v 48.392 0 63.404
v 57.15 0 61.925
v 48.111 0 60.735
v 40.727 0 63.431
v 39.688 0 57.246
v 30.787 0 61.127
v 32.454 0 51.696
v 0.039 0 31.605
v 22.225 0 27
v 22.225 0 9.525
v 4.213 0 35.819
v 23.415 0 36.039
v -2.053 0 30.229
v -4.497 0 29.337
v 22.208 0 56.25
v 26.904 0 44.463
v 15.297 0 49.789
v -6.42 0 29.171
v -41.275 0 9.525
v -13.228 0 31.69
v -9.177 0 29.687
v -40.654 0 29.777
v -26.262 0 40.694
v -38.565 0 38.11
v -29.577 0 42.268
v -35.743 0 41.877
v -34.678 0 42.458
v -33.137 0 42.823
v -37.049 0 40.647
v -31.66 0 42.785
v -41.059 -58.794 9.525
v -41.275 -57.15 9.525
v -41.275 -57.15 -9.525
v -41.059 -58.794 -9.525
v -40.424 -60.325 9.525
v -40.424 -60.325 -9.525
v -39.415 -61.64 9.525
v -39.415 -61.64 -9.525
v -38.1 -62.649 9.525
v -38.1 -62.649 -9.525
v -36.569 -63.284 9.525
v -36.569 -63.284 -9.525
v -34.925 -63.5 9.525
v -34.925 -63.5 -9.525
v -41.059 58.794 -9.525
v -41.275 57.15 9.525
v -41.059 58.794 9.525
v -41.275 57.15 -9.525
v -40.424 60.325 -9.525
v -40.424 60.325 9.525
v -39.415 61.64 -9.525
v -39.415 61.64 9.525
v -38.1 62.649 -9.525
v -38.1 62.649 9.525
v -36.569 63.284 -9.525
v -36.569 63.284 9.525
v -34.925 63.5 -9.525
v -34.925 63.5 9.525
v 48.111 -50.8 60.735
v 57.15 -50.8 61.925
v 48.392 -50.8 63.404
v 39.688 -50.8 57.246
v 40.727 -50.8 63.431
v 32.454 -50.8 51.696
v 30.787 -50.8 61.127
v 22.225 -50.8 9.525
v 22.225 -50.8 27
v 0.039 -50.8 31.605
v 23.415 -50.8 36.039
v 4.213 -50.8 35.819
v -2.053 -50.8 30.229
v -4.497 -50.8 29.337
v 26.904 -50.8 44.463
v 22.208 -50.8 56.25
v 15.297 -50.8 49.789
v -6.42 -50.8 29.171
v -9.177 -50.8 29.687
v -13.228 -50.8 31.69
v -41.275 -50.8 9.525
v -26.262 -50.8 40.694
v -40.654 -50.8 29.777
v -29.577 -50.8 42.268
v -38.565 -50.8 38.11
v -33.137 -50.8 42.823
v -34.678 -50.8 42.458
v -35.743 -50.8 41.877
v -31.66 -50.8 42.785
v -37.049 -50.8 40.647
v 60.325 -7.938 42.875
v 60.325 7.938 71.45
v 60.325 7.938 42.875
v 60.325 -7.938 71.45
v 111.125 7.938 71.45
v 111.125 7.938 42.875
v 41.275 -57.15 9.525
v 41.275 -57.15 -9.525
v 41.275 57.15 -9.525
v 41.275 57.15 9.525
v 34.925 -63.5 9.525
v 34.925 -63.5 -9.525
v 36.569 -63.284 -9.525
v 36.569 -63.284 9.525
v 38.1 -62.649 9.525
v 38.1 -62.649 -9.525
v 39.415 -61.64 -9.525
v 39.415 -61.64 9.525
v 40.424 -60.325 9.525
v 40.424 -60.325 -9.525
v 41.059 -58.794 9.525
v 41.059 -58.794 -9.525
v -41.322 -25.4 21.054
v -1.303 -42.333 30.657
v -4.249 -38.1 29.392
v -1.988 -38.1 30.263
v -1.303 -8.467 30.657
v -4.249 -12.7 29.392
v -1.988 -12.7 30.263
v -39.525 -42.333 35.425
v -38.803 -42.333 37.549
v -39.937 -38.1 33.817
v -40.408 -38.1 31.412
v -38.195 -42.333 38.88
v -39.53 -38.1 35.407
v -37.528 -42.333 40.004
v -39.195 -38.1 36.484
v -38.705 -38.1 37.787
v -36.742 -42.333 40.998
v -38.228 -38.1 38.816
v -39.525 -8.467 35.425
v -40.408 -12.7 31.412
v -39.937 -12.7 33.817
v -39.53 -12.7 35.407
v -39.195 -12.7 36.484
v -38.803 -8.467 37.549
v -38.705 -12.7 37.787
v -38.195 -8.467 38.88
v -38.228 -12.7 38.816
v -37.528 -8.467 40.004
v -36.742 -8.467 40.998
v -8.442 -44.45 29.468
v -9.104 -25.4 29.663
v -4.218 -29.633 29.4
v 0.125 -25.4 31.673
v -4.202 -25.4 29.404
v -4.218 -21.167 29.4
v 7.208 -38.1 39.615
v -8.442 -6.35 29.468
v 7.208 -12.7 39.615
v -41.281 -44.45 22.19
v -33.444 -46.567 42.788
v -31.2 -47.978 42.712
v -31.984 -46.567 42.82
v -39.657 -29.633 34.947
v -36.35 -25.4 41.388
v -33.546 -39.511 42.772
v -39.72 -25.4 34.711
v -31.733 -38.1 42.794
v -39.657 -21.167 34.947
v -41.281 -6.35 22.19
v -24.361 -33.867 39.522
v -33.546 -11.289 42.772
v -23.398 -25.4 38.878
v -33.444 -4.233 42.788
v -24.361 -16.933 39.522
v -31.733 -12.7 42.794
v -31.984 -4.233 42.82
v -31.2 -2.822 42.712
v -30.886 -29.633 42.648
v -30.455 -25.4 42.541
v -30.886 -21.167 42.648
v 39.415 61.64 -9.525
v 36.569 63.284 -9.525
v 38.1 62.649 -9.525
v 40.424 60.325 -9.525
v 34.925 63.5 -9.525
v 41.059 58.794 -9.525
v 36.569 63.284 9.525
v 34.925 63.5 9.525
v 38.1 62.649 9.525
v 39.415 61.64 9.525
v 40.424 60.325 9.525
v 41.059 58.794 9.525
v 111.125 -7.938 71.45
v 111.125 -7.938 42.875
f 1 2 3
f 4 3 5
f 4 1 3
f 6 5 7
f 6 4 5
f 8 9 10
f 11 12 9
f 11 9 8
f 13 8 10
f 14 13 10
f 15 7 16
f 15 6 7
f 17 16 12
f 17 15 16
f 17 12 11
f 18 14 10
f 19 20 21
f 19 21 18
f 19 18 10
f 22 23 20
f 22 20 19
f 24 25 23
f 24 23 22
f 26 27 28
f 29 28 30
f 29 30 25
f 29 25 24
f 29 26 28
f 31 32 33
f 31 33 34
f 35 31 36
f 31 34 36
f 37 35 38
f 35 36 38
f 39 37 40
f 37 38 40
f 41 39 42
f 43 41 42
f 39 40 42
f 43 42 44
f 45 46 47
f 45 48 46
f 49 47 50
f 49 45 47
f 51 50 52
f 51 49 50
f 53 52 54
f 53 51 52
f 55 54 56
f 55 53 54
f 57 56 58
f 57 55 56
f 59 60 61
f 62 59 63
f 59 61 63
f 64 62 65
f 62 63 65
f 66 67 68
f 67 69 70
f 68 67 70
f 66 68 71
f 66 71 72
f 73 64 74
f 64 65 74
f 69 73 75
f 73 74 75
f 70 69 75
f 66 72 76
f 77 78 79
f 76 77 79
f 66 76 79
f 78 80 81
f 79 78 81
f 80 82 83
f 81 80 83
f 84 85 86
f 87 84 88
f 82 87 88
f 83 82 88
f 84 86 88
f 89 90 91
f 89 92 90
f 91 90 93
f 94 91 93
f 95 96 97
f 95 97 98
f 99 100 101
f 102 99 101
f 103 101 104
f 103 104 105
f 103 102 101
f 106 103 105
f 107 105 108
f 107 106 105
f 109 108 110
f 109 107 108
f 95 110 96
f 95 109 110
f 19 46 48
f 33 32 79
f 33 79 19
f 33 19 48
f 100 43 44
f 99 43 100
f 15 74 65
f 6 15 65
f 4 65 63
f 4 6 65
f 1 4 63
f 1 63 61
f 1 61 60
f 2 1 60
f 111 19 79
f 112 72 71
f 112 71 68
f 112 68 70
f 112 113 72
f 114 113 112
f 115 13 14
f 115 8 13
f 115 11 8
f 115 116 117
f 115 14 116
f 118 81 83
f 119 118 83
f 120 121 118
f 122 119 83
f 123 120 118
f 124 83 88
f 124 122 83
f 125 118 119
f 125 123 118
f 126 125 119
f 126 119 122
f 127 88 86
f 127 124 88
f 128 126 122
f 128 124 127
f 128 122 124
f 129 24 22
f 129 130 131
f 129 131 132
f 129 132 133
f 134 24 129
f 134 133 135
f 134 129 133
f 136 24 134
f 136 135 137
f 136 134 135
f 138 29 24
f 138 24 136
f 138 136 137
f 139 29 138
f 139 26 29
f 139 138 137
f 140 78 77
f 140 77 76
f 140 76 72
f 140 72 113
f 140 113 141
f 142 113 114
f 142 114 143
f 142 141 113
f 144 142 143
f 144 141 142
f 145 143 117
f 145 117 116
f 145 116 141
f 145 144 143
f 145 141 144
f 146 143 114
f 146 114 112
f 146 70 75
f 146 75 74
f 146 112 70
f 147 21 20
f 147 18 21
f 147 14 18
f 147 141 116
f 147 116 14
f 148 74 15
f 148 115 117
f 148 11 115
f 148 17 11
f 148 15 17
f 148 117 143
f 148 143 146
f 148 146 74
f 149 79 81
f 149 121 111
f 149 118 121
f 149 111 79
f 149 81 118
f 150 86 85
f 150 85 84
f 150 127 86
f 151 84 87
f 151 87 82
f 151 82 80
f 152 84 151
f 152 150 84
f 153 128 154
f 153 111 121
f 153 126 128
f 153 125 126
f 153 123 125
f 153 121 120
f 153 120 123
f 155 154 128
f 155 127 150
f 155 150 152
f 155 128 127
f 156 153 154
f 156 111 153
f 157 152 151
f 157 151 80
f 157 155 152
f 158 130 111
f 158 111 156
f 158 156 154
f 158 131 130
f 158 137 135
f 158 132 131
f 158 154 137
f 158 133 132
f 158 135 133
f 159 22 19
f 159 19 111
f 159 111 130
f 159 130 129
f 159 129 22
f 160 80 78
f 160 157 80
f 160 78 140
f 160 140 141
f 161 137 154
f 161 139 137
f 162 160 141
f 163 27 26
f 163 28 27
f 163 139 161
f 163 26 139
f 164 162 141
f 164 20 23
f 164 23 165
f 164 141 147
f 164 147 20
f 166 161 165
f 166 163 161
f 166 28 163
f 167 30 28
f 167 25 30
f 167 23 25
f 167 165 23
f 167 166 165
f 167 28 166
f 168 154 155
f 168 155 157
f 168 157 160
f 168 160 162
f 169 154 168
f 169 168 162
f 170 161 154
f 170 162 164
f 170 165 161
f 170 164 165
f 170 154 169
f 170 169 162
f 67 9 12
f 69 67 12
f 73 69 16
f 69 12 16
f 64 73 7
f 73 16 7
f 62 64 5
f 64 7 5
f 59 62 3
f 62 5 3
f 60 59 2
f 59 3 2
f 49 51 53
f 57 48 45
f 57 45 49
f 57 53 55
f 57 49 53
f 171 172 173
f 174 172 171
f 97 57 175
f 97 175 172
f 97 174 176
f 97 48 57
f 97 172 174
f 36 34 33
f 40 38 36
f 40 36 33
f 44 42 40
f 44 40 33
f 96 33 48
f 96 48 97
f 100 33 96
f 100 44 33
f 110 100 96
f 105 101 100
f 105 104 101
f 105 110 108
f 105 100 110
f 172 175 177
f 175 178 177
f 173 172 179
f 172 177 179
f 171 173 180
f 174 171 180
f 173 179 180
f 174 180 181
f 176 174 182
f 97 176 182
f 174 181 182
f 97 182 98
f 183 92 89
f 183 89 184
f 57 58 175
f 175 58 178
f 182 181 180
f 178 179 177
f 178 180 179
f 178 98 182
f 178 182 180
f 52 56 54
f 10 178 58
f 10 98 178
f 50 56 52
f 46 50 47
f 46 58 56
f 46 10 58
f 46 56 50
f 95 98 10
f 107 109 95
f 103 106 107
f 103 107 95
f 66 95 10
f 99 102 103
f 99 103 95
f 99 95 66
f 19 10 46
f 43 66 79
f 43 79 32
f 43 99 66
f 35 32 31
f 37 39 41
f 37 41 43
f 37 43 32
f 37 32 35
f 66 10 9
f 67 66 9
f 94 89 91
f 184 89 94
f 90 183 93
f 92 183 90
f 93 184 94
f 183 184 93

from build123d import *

# Parameters (mm, degrees)
F1_DEPTH = 63.5
F2_DEPTH = 50.8
F3_DEPTH = 7.9375
F4_R     = 6.35


with BuildPart() as f1:
    # F0 (on Front) → F1 (new body, symmetric)
    with BuildSketch(Plane.XZ):
        Polygon((-41.275, 9.525), (-41.275, -9.525), (41.275, -9.525), (41.275, 9.525), (22.225, 9.525), align=None)
    extrude(amount=F1_DEPTH, both=True)

    # F0 (on Front) → F2 (join)
    with BuildSketch(Plane.XZ):
        with BuildLine():
            add(Edge.make_bspline(
                [(-41.275, 9.525), (-43.1729070842, 66.6683614254), (7.3597787426, -11.7160947828), (11.1603401601, 73.1296166778), (57.15, 61.9252)],
                knots=[0, 0, 0, 0, 0.4178115384, 1, 1, 1, 1], degree=3))
            Line((-41.275, 9.525), (22.225, 9.525))
            Line((22.225, 9.525), (22.225, 27.0002))
            ThreePointArc((22.225, 27.0002), (32.4542956671, 51.6959043329), (57.15, 61.9252))
        make_face()
    extrude(amount=F2_DEPTH)

    # F4
    f4_edges = [f1.edges().sort_by_distance(p)[0] for p in [
        (-41.275, -63.5, 0),
        (41.275, -63.5, 0),
        (41.275, 63.5, 0),
        (-41.275, 63.5, 0),
    ]]
    fillet(f4_edges, radius=F4_R)


with BuildPart() as f3:
    # F0 (on Front) → F3 (new body, symmetric)
    with BuildSketch(Plane.XZ):
        Polygon((60.325, 71.4502), (60.325, 61.9252), (60.325, 42.8752), (85.725, 42.8752), (111.125, 42.8752), (111.125, 71.4502), align=None)
    extrude(amount=F3_DEPTH, both=True)


solid = Compound([f1.part, f3.part])
